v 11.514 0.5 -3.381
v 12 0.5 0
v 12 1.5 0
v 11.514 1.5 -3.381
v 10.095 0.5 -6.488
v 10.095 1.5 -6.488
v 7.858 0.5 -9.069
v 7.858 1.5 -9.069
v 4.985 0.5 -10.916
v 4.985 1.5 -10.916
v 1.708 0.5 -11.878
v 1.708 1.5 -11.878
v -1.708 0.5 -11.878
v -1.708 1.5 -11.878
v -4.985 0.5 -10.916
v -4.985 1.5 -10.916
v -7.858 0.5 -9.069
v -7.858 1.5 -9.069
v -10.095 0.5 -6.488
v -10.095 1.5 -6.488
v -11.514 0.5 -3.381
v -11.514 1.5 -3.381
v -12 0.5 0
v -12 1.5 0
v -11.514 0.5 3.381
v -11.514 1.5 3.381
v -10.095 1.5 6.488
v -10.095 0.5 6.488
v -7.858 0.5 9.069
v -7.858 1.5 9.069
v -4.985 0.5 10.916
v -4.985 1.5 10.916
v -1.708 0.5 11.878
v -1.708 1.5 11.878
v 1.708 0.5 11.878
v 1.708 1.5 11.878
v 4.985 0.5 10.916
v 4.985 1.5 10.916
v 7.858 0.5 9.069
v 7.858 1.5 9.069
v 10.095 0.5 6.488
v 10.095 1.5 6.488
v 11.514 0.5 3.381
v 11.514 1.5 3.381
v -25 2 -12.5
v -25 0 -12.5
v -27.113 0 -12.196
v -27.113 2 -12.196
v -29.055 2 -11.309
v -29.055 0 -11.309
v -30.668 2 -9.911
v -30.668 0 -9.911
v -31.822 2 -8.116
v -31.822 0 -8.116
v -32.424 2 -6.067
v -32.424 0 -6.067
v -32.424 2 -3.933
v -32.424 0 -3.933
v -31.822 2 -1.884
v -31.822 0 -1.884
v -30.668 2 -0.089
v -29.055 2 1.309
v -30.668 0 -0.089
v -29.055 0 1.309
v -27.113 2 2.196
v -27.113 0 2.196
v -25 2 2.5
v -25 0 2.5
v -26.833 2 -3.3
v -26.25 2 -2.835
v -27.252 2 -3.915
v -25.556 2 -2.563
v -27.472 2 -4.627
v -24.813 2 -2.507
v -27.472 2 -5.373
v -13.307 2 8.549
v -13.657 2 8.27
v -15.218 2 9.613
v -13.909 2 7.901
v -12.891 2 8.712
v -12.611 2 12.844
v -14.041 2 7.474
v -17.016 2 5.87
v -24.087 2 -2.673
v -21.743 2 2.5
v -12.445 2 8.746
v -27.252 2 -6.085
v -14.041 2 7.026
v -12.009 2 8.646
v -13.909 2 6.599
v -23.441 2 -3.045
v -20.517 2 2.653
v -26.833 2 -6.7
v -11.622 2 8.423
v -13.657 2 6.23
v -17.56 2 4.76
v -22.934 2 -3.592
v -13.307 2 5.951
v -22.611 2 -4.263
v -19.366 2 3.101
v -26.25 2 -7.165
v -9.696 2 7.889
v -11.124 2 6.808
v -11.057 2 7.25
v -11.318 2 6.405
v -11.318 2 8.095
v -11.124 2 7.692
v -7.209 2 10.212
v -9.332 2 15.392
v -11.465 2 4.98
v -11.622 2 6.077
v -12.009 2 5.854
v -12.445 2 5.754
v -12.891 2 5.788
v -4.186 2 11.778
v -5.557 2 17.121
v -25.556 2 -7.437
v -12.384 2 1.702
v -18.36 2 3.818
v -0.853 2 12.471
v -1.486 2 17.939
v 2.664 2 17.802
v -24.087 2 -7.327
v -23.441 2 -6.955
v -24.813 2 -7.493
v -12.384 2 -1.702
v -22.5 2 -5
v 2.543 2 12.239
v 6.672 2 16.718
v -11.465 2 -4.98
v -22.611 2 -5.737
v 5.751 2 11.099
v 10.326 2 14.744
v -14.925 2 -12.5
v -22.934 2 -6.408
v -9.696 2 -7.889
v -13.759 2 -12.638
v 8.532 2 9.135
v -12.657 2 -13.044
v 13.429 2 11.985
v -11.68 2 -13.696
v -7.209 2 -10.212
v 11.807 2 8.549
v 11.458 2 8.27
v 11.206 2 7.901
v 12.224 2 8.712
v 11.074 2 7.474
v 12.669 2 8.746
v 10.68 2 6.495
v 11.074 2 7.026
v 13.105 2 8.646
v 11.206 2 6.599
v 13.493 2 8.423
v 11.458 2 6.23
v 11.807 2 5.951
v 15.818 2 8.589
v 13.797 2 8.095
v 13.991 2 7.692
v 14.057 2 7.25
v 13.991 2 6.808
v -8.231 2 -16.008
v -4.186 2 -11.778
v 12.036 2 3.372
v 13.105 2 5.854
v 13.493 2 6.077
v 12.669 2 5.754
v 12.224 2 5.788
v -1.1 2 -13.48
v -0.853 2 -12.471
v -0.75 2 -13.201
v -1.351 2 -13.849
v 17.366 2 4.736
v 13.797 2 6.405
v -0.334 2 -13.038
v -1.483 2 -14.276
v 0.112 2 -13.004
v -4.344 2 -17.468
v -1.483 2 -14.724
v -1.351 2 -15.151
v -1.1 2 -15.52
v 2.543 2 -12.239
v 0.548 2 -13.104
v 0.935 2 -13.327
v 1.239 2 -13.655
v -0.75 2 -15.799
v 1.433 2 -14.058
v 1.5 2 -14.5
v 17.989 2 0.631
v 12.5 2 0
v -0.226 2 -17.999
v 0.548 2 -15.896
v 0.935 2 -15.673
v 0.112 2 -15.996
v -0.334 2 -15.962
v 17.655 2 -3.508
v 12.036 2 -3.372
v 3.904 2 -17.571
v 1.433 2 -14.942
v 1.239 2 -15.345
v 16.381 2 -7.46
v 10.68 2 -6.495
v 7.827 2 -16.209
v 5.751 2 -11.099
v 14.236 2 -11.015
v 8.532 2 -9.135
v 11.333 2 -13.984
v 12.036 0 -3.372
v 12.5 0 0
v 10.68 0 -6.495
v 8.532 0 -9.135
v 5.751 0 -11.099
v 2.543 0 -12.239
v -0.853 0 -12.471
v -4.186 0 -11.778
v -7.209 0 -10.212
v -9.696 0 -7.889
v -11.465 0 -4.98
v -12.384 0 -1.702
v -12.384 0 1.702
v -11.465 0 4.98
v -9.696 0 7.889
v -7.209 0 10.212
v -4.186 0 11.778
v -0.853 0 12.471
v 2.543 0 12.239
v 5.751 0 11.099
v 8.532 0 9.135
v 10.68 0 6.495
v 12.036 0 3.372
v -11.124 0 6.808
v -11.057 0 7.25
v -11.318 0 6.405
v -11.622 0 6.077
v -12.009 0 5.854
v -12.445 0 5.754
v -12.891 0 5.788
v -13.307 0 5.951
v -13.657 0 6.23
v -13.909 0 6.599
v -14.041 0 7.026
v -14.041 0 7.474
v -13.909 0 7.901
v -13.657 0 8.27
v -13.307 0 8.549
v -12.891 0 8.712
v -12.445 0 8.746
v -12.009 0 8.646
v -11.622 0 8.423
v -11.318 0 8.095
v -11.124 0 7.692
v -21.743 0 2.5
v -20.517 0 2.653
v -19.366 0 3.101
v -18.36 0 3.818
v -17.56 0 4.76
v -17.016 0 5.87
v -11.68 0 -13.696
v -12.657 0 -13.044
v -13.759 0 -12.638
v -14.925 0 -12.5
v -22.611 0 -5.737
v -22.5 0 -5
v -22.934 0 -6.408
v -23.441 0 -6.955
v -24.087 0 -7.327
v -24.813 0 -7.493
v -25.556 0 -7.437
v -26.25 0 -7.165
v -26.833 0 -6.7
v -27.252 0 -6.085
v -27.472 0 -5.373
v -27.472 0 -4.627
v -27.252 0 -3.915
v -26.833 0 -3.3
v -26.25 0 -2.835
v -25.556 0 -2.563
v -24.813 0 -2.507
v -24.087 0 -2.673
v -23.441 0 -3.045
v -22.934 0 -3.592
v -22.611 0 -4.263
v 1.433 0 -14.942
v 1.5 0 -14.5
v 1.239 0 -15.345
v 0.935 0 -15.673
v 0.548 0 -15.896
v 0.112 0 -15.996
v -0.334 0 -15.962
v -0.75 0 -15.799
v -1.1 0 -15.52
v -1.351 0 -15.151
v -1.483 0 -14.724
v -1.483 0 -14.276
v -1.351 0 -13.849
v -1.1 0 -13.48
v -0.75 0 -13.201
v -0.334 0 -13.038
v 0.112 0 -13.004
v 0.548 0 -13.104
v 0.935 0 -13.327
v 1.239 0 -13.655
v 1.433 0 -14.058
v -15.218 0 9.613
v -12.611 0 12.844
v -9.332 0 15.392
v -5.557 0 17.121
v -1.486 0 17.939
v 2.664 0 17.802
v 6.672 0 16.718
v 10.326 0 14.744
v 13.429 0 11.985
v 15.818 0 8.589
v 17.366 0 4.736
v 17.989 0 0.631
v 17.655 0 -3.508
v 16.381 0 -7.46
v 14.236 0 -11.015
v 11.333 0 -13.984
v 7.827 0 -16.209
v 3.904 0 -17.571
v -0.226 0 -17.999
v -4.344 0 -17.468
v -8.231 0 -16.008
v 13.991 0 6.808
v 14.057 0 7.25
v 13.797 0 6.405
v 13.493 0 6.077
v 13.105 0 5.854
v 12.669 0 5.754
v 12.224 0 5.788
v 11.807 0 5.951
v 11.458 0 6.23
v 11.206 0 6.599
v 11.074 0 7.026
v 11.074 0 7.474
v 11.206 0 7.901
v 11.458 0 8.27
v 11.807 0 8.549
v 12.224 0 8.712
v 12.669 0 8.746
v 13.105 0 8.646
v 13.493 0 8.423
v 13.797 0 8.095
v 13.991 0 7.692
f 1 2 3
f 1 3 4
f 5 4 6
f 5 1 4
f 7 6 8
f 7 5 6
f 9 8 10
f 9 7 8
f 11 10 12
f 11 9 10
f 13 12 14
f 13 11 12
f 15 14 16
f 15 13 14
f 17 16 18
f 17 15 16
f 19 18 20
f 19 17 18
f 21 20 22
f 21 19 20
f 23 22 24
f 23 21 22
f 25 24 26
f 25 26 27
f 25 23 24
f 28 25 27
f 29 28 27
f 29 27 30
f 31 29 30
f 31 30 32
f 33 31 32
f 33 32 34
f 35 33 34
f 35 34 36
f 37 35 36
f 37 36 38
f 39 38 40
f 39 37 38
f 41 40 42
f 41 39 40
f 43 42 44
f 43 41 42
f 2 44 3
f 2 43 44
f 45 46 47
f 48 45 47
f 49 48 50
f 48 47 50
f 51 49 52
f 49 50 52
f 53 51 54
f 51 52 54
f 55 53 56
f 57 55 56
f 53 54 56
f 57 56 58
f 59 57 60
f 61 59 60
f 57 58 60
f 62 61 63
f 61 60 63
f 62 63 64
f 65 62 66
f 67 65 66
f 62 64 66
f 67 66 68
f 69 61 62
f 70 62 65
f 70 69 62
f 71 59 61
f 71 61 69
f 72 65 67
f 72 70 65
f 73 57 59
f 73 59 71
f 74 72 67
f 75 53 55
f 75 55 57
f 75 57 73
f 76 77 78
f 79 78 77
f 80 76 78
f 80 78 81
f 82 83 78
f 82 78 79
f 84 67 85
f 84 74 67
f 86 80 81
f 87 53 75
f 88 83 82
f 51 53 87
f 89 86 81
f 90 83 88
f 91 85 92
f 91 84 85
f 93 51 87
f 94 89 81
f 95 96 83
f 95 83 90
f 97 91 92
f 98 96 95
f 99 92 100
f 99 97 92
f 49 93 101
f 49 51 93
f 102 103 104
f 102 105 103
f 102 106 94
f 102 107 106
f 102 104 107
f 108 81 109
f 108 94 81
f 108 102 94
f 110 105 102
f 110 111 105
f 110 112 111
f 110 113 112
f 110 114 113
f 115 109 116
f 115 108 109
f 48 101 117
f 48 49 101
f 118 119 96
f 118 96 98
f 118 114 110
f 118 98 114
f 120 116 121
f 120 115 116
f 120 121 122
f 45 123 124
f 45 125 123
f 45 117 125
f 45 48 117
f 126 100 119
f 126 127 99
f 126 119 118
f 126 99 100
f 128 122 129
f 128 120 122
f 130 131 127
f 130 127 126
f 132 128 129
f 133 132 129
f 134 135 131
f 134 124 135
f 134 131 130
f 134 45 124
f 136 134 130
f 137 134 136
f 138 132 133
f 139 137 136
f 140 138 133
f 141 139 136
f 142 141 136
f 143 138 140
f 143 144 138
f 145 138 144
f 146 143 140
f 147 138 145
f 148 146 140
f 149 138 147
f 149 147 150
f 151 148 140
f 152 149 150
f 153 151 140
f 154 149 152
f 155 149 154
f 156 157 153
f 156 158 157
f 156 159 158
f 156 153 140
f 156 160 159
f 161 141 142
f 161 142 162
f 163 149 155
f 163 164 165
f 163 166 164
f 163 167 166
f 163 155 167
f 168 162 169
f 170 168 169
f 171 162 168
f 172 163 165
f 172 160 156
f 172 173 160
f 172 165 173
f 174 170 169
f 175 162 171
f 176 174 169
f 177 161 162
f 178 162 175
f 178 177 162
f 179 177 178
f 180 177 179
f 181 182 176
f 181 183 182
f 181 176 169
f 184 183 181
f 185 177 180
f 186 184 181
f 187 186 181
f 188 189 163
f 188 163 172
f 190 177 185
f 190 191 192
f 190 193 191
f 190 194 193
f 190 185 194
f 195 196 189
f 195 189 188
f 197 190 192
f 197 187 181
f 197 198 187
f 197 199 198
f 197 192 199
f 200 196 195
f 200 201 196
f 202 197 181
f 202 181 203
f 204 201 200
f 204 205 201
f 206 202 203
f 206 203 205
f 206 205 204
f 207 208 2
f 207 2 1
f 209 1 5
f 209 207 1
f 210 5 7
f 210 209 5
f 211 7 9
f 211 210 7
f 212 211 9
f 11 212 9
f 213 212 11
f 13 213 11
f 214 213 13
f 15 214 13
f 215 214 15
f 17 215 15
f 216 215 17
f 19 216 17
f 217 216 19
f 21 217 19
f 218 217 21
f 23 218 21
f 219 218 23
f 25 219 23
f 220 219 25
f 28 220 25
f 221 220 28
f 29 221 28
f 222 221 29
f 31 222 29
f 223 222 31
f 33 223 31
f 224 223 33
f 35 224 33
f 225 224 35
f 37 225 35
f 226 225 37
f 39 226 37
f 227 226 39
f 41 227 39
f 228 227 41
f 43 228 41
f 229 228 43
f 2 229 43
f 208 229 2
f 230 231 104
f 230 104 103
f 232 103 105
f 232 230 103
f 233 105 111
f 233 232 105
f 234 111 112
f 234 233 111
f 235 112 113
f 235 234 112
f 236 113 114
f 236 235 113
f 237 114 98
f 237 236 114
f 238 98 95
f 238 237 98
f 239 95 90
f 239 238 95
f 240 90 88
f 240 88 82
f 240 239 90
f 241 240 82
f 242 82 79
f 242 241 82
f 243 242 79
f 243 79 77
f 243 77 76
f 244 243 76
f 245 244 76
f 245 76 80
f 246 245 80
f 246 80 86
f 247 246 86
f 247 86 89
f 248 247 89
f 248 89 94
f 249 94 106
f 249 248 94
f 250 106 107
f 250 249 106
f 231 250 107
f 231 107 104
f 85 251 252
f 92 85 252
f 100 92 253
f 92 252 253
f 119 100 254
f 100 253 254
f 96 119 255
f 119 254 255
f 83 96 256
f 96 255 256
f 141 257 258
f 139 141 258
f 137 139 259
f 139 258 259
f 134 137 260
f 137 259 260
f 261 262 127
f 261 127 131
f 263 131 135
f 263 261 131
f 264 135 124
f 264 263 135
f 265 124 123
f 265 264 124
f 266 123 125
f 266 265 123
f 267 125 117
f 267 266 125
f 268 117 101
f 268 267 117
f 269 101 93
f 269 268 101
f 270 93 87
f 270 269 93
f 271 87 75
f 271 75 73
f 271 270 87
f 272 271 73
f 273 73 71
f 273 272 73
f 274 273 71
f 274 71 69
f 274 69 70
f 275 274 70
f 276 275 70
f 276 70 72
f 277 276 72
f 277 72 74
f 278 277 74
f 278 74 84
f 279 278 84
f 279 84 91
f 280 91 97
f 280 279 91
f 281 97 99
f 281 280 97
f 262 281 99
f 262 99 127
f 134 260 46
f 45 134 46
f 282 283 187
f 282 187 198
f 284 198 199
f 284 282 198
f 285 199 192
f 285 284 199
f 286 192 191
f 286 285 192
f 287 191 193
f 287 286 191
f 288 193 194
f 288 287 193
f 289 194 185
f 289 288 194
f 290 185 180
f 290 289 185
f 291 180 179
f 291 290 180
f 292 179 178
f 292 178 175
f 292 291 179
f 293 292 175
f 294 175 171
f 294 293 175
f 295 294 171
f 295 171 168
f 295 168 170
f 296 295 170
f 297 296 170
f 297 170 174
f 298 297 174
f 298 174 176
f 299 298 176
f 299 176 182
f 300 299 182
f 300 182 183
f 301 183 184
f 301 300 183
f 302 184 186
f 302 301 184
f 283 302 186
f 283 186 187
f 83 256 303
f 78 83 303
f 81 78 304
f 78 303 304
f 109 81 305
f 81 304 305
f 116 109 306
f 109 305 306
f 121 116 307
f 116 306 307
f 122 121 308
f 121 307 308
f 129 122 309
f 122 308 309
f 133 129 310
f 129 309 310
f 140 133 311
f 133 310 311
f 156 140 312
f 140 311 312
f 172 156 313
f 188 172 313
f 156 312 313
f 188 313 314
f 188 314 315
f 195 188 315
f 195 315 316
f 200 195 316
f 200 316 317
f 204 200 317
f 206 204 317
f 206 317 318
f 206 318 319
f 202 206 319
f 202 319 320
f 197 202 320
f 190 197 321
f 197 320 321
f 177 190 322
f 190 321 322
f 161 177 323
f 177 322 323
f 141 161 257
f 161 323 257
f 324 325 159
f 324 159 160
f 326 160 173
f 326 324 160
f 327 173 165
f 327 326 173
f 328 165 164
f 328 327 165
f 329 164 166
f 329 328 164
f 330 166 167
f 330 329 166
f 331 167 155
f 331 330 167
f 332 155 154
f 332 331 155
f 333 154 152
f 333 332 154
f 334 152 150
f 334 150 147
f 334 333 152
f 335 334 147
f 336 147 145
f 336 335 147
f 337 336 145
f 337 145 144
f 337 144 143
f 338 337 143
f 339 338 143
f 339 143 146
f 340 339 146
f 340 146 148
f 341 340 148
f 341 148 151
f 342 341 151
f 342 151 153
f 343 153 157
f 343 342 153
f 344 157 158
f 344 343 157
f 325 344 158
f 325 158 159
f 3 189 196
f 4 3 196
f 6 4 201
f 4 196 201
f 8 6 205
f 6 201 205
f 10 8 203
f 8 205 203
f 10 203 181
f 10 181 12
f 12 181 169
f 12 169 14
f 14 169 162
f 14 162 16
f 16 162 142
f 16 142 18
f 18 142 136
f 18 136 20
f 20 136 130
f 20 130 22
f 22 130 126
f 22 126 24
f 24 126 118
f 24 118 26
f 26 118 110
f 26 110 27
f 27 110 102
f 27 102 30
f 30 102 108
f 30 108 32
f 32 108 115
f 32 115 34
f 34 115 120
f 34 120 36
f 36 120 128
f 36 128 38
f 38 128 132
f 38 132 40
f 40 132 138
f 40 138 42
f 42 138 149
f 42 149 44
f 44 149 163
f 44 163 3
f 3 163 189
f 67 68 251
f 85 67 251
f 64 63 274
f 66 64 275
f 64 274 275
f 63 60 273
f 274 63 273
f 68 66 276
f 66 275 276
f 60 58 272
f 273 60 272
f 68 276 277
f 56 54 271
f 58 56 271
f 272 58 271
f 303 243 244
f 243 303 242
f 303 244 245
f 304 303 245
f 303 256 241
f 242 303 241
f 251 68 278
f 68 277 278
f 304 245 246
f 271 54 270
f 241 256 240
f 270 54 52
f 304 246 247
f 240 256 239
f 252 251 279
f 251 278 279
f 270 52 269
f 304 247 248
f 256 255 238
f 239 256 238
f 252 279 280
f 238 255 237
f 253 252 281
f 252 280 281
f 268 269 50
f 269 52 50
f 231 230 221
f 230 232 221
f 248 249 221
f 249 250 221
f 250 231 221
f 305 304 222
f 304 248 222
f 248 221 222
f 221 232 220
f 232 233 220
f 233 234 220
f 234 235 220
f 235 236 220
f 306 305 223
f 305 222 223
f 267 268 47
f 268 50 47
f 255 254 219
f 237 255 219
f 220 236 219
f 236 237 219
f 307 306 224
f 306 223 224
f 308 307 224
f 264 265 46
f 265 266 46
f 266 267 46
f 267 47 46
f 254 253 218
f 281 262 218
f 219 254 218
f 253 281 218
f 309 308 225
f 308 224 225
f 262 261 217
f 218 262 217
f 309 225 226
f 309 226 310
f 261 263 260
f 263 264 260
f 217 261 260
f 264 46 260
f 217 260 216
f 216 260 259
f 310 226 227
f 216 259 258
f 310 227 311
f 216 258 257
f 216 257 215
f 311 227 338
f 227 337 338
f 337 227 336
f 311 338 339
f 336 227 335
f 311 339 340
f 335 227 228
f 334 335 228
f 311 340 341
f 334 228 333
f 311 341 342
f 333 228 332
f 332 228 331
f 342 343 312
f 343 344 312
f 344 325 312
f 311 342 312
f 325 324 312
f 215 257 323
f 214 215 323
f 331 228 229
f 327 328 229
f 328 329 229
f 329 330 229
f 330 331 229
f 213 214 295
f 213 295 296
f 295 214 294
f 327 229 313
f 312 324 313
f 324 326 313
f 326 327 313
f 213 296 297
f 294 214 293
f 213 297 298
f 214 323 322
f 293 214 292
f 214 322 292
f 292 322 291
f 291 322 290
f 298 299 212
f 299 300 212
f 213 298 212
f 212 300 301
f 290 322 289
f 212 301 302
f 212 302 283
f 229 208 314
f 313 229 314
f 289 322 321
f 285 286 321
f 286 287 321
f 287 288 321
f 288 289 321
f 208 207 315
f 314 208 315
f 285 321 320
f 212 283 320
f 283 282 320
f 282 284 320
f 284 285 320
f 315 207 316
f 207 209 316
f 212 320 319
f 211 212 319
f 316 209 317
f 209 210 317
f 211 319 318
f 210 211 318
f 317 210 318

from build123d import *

# Parameters (mm, degrees)
ESQUISSE1_R      = 12
ESQUISSE1_R_2    = 1.5
ESQUISSE1_R_3    = 2.5
EXTRUSION1_DEPTH = 2
CHANFREIN1_SIZE  = 0.5


with BuildPart() as part:
    # Esquisse1 → Extrusion1 (new body)
    with BuildSketch(Plane(origin=(0, 0, 0), x_dir=(1, 0, 0), z_dir=(0, 1, 0))):
        with BuildLine():
            Line((-25, -2.5), (-21.742814905, -2.5))
            ThreePointArc((-21.742814905, -2.5), (-18.840417096, -3.428625913), (-17.016116013, -5.869565217))
            ThreePointArc((-17.016116013, -5.869565217), (17.365780251, -4.735997916), (-11.680287305, 13.695652174))
            ThreePointArc((-11.680287305, 13.695652174), (-13.19590137, 12.808425684), (-14.924811557, 12.5))
            Line((-14.924811557, 12.5), (-25, 12.5))
            ThreePointArc((-25, 12.5), (-32.5, 5), (-25, -2.5))
        make_face()
        Circle(ESQUISSE1_R, mode=Mode.SUBTRACT)
        with Locations((-12.557368355, -7.25)):
            Circle(ESQUISSE1_R_2, mode=Mode.SUBTRACT)
        with Locations((12.557368355, -7.25)):
            Circle(ESQUISSE1_R_2, mode=Mode.SUBTRACT)
        with Locations((0, 14.5)):
            Circle(ESQUISSE1_R_2, mode=Mode.SUBTRACT)
        with Locations((-25, 5)):
            Circle(ESQUISSE1_R_3, mode=Mode.SUBTRACT)
    extrude(amount=EXTRUSION1_DEPTH)

    # Chanfrein1
    chanfrein1_edges = [part.edges().sort_by_distance(p)[0] for p in [
        (-12, 0, 0),
        (-12, 2, 0),
    ]]
    chamfer(chanfrein1_edges, length=CHANFREIN1_SIZE)


solid = part.part
